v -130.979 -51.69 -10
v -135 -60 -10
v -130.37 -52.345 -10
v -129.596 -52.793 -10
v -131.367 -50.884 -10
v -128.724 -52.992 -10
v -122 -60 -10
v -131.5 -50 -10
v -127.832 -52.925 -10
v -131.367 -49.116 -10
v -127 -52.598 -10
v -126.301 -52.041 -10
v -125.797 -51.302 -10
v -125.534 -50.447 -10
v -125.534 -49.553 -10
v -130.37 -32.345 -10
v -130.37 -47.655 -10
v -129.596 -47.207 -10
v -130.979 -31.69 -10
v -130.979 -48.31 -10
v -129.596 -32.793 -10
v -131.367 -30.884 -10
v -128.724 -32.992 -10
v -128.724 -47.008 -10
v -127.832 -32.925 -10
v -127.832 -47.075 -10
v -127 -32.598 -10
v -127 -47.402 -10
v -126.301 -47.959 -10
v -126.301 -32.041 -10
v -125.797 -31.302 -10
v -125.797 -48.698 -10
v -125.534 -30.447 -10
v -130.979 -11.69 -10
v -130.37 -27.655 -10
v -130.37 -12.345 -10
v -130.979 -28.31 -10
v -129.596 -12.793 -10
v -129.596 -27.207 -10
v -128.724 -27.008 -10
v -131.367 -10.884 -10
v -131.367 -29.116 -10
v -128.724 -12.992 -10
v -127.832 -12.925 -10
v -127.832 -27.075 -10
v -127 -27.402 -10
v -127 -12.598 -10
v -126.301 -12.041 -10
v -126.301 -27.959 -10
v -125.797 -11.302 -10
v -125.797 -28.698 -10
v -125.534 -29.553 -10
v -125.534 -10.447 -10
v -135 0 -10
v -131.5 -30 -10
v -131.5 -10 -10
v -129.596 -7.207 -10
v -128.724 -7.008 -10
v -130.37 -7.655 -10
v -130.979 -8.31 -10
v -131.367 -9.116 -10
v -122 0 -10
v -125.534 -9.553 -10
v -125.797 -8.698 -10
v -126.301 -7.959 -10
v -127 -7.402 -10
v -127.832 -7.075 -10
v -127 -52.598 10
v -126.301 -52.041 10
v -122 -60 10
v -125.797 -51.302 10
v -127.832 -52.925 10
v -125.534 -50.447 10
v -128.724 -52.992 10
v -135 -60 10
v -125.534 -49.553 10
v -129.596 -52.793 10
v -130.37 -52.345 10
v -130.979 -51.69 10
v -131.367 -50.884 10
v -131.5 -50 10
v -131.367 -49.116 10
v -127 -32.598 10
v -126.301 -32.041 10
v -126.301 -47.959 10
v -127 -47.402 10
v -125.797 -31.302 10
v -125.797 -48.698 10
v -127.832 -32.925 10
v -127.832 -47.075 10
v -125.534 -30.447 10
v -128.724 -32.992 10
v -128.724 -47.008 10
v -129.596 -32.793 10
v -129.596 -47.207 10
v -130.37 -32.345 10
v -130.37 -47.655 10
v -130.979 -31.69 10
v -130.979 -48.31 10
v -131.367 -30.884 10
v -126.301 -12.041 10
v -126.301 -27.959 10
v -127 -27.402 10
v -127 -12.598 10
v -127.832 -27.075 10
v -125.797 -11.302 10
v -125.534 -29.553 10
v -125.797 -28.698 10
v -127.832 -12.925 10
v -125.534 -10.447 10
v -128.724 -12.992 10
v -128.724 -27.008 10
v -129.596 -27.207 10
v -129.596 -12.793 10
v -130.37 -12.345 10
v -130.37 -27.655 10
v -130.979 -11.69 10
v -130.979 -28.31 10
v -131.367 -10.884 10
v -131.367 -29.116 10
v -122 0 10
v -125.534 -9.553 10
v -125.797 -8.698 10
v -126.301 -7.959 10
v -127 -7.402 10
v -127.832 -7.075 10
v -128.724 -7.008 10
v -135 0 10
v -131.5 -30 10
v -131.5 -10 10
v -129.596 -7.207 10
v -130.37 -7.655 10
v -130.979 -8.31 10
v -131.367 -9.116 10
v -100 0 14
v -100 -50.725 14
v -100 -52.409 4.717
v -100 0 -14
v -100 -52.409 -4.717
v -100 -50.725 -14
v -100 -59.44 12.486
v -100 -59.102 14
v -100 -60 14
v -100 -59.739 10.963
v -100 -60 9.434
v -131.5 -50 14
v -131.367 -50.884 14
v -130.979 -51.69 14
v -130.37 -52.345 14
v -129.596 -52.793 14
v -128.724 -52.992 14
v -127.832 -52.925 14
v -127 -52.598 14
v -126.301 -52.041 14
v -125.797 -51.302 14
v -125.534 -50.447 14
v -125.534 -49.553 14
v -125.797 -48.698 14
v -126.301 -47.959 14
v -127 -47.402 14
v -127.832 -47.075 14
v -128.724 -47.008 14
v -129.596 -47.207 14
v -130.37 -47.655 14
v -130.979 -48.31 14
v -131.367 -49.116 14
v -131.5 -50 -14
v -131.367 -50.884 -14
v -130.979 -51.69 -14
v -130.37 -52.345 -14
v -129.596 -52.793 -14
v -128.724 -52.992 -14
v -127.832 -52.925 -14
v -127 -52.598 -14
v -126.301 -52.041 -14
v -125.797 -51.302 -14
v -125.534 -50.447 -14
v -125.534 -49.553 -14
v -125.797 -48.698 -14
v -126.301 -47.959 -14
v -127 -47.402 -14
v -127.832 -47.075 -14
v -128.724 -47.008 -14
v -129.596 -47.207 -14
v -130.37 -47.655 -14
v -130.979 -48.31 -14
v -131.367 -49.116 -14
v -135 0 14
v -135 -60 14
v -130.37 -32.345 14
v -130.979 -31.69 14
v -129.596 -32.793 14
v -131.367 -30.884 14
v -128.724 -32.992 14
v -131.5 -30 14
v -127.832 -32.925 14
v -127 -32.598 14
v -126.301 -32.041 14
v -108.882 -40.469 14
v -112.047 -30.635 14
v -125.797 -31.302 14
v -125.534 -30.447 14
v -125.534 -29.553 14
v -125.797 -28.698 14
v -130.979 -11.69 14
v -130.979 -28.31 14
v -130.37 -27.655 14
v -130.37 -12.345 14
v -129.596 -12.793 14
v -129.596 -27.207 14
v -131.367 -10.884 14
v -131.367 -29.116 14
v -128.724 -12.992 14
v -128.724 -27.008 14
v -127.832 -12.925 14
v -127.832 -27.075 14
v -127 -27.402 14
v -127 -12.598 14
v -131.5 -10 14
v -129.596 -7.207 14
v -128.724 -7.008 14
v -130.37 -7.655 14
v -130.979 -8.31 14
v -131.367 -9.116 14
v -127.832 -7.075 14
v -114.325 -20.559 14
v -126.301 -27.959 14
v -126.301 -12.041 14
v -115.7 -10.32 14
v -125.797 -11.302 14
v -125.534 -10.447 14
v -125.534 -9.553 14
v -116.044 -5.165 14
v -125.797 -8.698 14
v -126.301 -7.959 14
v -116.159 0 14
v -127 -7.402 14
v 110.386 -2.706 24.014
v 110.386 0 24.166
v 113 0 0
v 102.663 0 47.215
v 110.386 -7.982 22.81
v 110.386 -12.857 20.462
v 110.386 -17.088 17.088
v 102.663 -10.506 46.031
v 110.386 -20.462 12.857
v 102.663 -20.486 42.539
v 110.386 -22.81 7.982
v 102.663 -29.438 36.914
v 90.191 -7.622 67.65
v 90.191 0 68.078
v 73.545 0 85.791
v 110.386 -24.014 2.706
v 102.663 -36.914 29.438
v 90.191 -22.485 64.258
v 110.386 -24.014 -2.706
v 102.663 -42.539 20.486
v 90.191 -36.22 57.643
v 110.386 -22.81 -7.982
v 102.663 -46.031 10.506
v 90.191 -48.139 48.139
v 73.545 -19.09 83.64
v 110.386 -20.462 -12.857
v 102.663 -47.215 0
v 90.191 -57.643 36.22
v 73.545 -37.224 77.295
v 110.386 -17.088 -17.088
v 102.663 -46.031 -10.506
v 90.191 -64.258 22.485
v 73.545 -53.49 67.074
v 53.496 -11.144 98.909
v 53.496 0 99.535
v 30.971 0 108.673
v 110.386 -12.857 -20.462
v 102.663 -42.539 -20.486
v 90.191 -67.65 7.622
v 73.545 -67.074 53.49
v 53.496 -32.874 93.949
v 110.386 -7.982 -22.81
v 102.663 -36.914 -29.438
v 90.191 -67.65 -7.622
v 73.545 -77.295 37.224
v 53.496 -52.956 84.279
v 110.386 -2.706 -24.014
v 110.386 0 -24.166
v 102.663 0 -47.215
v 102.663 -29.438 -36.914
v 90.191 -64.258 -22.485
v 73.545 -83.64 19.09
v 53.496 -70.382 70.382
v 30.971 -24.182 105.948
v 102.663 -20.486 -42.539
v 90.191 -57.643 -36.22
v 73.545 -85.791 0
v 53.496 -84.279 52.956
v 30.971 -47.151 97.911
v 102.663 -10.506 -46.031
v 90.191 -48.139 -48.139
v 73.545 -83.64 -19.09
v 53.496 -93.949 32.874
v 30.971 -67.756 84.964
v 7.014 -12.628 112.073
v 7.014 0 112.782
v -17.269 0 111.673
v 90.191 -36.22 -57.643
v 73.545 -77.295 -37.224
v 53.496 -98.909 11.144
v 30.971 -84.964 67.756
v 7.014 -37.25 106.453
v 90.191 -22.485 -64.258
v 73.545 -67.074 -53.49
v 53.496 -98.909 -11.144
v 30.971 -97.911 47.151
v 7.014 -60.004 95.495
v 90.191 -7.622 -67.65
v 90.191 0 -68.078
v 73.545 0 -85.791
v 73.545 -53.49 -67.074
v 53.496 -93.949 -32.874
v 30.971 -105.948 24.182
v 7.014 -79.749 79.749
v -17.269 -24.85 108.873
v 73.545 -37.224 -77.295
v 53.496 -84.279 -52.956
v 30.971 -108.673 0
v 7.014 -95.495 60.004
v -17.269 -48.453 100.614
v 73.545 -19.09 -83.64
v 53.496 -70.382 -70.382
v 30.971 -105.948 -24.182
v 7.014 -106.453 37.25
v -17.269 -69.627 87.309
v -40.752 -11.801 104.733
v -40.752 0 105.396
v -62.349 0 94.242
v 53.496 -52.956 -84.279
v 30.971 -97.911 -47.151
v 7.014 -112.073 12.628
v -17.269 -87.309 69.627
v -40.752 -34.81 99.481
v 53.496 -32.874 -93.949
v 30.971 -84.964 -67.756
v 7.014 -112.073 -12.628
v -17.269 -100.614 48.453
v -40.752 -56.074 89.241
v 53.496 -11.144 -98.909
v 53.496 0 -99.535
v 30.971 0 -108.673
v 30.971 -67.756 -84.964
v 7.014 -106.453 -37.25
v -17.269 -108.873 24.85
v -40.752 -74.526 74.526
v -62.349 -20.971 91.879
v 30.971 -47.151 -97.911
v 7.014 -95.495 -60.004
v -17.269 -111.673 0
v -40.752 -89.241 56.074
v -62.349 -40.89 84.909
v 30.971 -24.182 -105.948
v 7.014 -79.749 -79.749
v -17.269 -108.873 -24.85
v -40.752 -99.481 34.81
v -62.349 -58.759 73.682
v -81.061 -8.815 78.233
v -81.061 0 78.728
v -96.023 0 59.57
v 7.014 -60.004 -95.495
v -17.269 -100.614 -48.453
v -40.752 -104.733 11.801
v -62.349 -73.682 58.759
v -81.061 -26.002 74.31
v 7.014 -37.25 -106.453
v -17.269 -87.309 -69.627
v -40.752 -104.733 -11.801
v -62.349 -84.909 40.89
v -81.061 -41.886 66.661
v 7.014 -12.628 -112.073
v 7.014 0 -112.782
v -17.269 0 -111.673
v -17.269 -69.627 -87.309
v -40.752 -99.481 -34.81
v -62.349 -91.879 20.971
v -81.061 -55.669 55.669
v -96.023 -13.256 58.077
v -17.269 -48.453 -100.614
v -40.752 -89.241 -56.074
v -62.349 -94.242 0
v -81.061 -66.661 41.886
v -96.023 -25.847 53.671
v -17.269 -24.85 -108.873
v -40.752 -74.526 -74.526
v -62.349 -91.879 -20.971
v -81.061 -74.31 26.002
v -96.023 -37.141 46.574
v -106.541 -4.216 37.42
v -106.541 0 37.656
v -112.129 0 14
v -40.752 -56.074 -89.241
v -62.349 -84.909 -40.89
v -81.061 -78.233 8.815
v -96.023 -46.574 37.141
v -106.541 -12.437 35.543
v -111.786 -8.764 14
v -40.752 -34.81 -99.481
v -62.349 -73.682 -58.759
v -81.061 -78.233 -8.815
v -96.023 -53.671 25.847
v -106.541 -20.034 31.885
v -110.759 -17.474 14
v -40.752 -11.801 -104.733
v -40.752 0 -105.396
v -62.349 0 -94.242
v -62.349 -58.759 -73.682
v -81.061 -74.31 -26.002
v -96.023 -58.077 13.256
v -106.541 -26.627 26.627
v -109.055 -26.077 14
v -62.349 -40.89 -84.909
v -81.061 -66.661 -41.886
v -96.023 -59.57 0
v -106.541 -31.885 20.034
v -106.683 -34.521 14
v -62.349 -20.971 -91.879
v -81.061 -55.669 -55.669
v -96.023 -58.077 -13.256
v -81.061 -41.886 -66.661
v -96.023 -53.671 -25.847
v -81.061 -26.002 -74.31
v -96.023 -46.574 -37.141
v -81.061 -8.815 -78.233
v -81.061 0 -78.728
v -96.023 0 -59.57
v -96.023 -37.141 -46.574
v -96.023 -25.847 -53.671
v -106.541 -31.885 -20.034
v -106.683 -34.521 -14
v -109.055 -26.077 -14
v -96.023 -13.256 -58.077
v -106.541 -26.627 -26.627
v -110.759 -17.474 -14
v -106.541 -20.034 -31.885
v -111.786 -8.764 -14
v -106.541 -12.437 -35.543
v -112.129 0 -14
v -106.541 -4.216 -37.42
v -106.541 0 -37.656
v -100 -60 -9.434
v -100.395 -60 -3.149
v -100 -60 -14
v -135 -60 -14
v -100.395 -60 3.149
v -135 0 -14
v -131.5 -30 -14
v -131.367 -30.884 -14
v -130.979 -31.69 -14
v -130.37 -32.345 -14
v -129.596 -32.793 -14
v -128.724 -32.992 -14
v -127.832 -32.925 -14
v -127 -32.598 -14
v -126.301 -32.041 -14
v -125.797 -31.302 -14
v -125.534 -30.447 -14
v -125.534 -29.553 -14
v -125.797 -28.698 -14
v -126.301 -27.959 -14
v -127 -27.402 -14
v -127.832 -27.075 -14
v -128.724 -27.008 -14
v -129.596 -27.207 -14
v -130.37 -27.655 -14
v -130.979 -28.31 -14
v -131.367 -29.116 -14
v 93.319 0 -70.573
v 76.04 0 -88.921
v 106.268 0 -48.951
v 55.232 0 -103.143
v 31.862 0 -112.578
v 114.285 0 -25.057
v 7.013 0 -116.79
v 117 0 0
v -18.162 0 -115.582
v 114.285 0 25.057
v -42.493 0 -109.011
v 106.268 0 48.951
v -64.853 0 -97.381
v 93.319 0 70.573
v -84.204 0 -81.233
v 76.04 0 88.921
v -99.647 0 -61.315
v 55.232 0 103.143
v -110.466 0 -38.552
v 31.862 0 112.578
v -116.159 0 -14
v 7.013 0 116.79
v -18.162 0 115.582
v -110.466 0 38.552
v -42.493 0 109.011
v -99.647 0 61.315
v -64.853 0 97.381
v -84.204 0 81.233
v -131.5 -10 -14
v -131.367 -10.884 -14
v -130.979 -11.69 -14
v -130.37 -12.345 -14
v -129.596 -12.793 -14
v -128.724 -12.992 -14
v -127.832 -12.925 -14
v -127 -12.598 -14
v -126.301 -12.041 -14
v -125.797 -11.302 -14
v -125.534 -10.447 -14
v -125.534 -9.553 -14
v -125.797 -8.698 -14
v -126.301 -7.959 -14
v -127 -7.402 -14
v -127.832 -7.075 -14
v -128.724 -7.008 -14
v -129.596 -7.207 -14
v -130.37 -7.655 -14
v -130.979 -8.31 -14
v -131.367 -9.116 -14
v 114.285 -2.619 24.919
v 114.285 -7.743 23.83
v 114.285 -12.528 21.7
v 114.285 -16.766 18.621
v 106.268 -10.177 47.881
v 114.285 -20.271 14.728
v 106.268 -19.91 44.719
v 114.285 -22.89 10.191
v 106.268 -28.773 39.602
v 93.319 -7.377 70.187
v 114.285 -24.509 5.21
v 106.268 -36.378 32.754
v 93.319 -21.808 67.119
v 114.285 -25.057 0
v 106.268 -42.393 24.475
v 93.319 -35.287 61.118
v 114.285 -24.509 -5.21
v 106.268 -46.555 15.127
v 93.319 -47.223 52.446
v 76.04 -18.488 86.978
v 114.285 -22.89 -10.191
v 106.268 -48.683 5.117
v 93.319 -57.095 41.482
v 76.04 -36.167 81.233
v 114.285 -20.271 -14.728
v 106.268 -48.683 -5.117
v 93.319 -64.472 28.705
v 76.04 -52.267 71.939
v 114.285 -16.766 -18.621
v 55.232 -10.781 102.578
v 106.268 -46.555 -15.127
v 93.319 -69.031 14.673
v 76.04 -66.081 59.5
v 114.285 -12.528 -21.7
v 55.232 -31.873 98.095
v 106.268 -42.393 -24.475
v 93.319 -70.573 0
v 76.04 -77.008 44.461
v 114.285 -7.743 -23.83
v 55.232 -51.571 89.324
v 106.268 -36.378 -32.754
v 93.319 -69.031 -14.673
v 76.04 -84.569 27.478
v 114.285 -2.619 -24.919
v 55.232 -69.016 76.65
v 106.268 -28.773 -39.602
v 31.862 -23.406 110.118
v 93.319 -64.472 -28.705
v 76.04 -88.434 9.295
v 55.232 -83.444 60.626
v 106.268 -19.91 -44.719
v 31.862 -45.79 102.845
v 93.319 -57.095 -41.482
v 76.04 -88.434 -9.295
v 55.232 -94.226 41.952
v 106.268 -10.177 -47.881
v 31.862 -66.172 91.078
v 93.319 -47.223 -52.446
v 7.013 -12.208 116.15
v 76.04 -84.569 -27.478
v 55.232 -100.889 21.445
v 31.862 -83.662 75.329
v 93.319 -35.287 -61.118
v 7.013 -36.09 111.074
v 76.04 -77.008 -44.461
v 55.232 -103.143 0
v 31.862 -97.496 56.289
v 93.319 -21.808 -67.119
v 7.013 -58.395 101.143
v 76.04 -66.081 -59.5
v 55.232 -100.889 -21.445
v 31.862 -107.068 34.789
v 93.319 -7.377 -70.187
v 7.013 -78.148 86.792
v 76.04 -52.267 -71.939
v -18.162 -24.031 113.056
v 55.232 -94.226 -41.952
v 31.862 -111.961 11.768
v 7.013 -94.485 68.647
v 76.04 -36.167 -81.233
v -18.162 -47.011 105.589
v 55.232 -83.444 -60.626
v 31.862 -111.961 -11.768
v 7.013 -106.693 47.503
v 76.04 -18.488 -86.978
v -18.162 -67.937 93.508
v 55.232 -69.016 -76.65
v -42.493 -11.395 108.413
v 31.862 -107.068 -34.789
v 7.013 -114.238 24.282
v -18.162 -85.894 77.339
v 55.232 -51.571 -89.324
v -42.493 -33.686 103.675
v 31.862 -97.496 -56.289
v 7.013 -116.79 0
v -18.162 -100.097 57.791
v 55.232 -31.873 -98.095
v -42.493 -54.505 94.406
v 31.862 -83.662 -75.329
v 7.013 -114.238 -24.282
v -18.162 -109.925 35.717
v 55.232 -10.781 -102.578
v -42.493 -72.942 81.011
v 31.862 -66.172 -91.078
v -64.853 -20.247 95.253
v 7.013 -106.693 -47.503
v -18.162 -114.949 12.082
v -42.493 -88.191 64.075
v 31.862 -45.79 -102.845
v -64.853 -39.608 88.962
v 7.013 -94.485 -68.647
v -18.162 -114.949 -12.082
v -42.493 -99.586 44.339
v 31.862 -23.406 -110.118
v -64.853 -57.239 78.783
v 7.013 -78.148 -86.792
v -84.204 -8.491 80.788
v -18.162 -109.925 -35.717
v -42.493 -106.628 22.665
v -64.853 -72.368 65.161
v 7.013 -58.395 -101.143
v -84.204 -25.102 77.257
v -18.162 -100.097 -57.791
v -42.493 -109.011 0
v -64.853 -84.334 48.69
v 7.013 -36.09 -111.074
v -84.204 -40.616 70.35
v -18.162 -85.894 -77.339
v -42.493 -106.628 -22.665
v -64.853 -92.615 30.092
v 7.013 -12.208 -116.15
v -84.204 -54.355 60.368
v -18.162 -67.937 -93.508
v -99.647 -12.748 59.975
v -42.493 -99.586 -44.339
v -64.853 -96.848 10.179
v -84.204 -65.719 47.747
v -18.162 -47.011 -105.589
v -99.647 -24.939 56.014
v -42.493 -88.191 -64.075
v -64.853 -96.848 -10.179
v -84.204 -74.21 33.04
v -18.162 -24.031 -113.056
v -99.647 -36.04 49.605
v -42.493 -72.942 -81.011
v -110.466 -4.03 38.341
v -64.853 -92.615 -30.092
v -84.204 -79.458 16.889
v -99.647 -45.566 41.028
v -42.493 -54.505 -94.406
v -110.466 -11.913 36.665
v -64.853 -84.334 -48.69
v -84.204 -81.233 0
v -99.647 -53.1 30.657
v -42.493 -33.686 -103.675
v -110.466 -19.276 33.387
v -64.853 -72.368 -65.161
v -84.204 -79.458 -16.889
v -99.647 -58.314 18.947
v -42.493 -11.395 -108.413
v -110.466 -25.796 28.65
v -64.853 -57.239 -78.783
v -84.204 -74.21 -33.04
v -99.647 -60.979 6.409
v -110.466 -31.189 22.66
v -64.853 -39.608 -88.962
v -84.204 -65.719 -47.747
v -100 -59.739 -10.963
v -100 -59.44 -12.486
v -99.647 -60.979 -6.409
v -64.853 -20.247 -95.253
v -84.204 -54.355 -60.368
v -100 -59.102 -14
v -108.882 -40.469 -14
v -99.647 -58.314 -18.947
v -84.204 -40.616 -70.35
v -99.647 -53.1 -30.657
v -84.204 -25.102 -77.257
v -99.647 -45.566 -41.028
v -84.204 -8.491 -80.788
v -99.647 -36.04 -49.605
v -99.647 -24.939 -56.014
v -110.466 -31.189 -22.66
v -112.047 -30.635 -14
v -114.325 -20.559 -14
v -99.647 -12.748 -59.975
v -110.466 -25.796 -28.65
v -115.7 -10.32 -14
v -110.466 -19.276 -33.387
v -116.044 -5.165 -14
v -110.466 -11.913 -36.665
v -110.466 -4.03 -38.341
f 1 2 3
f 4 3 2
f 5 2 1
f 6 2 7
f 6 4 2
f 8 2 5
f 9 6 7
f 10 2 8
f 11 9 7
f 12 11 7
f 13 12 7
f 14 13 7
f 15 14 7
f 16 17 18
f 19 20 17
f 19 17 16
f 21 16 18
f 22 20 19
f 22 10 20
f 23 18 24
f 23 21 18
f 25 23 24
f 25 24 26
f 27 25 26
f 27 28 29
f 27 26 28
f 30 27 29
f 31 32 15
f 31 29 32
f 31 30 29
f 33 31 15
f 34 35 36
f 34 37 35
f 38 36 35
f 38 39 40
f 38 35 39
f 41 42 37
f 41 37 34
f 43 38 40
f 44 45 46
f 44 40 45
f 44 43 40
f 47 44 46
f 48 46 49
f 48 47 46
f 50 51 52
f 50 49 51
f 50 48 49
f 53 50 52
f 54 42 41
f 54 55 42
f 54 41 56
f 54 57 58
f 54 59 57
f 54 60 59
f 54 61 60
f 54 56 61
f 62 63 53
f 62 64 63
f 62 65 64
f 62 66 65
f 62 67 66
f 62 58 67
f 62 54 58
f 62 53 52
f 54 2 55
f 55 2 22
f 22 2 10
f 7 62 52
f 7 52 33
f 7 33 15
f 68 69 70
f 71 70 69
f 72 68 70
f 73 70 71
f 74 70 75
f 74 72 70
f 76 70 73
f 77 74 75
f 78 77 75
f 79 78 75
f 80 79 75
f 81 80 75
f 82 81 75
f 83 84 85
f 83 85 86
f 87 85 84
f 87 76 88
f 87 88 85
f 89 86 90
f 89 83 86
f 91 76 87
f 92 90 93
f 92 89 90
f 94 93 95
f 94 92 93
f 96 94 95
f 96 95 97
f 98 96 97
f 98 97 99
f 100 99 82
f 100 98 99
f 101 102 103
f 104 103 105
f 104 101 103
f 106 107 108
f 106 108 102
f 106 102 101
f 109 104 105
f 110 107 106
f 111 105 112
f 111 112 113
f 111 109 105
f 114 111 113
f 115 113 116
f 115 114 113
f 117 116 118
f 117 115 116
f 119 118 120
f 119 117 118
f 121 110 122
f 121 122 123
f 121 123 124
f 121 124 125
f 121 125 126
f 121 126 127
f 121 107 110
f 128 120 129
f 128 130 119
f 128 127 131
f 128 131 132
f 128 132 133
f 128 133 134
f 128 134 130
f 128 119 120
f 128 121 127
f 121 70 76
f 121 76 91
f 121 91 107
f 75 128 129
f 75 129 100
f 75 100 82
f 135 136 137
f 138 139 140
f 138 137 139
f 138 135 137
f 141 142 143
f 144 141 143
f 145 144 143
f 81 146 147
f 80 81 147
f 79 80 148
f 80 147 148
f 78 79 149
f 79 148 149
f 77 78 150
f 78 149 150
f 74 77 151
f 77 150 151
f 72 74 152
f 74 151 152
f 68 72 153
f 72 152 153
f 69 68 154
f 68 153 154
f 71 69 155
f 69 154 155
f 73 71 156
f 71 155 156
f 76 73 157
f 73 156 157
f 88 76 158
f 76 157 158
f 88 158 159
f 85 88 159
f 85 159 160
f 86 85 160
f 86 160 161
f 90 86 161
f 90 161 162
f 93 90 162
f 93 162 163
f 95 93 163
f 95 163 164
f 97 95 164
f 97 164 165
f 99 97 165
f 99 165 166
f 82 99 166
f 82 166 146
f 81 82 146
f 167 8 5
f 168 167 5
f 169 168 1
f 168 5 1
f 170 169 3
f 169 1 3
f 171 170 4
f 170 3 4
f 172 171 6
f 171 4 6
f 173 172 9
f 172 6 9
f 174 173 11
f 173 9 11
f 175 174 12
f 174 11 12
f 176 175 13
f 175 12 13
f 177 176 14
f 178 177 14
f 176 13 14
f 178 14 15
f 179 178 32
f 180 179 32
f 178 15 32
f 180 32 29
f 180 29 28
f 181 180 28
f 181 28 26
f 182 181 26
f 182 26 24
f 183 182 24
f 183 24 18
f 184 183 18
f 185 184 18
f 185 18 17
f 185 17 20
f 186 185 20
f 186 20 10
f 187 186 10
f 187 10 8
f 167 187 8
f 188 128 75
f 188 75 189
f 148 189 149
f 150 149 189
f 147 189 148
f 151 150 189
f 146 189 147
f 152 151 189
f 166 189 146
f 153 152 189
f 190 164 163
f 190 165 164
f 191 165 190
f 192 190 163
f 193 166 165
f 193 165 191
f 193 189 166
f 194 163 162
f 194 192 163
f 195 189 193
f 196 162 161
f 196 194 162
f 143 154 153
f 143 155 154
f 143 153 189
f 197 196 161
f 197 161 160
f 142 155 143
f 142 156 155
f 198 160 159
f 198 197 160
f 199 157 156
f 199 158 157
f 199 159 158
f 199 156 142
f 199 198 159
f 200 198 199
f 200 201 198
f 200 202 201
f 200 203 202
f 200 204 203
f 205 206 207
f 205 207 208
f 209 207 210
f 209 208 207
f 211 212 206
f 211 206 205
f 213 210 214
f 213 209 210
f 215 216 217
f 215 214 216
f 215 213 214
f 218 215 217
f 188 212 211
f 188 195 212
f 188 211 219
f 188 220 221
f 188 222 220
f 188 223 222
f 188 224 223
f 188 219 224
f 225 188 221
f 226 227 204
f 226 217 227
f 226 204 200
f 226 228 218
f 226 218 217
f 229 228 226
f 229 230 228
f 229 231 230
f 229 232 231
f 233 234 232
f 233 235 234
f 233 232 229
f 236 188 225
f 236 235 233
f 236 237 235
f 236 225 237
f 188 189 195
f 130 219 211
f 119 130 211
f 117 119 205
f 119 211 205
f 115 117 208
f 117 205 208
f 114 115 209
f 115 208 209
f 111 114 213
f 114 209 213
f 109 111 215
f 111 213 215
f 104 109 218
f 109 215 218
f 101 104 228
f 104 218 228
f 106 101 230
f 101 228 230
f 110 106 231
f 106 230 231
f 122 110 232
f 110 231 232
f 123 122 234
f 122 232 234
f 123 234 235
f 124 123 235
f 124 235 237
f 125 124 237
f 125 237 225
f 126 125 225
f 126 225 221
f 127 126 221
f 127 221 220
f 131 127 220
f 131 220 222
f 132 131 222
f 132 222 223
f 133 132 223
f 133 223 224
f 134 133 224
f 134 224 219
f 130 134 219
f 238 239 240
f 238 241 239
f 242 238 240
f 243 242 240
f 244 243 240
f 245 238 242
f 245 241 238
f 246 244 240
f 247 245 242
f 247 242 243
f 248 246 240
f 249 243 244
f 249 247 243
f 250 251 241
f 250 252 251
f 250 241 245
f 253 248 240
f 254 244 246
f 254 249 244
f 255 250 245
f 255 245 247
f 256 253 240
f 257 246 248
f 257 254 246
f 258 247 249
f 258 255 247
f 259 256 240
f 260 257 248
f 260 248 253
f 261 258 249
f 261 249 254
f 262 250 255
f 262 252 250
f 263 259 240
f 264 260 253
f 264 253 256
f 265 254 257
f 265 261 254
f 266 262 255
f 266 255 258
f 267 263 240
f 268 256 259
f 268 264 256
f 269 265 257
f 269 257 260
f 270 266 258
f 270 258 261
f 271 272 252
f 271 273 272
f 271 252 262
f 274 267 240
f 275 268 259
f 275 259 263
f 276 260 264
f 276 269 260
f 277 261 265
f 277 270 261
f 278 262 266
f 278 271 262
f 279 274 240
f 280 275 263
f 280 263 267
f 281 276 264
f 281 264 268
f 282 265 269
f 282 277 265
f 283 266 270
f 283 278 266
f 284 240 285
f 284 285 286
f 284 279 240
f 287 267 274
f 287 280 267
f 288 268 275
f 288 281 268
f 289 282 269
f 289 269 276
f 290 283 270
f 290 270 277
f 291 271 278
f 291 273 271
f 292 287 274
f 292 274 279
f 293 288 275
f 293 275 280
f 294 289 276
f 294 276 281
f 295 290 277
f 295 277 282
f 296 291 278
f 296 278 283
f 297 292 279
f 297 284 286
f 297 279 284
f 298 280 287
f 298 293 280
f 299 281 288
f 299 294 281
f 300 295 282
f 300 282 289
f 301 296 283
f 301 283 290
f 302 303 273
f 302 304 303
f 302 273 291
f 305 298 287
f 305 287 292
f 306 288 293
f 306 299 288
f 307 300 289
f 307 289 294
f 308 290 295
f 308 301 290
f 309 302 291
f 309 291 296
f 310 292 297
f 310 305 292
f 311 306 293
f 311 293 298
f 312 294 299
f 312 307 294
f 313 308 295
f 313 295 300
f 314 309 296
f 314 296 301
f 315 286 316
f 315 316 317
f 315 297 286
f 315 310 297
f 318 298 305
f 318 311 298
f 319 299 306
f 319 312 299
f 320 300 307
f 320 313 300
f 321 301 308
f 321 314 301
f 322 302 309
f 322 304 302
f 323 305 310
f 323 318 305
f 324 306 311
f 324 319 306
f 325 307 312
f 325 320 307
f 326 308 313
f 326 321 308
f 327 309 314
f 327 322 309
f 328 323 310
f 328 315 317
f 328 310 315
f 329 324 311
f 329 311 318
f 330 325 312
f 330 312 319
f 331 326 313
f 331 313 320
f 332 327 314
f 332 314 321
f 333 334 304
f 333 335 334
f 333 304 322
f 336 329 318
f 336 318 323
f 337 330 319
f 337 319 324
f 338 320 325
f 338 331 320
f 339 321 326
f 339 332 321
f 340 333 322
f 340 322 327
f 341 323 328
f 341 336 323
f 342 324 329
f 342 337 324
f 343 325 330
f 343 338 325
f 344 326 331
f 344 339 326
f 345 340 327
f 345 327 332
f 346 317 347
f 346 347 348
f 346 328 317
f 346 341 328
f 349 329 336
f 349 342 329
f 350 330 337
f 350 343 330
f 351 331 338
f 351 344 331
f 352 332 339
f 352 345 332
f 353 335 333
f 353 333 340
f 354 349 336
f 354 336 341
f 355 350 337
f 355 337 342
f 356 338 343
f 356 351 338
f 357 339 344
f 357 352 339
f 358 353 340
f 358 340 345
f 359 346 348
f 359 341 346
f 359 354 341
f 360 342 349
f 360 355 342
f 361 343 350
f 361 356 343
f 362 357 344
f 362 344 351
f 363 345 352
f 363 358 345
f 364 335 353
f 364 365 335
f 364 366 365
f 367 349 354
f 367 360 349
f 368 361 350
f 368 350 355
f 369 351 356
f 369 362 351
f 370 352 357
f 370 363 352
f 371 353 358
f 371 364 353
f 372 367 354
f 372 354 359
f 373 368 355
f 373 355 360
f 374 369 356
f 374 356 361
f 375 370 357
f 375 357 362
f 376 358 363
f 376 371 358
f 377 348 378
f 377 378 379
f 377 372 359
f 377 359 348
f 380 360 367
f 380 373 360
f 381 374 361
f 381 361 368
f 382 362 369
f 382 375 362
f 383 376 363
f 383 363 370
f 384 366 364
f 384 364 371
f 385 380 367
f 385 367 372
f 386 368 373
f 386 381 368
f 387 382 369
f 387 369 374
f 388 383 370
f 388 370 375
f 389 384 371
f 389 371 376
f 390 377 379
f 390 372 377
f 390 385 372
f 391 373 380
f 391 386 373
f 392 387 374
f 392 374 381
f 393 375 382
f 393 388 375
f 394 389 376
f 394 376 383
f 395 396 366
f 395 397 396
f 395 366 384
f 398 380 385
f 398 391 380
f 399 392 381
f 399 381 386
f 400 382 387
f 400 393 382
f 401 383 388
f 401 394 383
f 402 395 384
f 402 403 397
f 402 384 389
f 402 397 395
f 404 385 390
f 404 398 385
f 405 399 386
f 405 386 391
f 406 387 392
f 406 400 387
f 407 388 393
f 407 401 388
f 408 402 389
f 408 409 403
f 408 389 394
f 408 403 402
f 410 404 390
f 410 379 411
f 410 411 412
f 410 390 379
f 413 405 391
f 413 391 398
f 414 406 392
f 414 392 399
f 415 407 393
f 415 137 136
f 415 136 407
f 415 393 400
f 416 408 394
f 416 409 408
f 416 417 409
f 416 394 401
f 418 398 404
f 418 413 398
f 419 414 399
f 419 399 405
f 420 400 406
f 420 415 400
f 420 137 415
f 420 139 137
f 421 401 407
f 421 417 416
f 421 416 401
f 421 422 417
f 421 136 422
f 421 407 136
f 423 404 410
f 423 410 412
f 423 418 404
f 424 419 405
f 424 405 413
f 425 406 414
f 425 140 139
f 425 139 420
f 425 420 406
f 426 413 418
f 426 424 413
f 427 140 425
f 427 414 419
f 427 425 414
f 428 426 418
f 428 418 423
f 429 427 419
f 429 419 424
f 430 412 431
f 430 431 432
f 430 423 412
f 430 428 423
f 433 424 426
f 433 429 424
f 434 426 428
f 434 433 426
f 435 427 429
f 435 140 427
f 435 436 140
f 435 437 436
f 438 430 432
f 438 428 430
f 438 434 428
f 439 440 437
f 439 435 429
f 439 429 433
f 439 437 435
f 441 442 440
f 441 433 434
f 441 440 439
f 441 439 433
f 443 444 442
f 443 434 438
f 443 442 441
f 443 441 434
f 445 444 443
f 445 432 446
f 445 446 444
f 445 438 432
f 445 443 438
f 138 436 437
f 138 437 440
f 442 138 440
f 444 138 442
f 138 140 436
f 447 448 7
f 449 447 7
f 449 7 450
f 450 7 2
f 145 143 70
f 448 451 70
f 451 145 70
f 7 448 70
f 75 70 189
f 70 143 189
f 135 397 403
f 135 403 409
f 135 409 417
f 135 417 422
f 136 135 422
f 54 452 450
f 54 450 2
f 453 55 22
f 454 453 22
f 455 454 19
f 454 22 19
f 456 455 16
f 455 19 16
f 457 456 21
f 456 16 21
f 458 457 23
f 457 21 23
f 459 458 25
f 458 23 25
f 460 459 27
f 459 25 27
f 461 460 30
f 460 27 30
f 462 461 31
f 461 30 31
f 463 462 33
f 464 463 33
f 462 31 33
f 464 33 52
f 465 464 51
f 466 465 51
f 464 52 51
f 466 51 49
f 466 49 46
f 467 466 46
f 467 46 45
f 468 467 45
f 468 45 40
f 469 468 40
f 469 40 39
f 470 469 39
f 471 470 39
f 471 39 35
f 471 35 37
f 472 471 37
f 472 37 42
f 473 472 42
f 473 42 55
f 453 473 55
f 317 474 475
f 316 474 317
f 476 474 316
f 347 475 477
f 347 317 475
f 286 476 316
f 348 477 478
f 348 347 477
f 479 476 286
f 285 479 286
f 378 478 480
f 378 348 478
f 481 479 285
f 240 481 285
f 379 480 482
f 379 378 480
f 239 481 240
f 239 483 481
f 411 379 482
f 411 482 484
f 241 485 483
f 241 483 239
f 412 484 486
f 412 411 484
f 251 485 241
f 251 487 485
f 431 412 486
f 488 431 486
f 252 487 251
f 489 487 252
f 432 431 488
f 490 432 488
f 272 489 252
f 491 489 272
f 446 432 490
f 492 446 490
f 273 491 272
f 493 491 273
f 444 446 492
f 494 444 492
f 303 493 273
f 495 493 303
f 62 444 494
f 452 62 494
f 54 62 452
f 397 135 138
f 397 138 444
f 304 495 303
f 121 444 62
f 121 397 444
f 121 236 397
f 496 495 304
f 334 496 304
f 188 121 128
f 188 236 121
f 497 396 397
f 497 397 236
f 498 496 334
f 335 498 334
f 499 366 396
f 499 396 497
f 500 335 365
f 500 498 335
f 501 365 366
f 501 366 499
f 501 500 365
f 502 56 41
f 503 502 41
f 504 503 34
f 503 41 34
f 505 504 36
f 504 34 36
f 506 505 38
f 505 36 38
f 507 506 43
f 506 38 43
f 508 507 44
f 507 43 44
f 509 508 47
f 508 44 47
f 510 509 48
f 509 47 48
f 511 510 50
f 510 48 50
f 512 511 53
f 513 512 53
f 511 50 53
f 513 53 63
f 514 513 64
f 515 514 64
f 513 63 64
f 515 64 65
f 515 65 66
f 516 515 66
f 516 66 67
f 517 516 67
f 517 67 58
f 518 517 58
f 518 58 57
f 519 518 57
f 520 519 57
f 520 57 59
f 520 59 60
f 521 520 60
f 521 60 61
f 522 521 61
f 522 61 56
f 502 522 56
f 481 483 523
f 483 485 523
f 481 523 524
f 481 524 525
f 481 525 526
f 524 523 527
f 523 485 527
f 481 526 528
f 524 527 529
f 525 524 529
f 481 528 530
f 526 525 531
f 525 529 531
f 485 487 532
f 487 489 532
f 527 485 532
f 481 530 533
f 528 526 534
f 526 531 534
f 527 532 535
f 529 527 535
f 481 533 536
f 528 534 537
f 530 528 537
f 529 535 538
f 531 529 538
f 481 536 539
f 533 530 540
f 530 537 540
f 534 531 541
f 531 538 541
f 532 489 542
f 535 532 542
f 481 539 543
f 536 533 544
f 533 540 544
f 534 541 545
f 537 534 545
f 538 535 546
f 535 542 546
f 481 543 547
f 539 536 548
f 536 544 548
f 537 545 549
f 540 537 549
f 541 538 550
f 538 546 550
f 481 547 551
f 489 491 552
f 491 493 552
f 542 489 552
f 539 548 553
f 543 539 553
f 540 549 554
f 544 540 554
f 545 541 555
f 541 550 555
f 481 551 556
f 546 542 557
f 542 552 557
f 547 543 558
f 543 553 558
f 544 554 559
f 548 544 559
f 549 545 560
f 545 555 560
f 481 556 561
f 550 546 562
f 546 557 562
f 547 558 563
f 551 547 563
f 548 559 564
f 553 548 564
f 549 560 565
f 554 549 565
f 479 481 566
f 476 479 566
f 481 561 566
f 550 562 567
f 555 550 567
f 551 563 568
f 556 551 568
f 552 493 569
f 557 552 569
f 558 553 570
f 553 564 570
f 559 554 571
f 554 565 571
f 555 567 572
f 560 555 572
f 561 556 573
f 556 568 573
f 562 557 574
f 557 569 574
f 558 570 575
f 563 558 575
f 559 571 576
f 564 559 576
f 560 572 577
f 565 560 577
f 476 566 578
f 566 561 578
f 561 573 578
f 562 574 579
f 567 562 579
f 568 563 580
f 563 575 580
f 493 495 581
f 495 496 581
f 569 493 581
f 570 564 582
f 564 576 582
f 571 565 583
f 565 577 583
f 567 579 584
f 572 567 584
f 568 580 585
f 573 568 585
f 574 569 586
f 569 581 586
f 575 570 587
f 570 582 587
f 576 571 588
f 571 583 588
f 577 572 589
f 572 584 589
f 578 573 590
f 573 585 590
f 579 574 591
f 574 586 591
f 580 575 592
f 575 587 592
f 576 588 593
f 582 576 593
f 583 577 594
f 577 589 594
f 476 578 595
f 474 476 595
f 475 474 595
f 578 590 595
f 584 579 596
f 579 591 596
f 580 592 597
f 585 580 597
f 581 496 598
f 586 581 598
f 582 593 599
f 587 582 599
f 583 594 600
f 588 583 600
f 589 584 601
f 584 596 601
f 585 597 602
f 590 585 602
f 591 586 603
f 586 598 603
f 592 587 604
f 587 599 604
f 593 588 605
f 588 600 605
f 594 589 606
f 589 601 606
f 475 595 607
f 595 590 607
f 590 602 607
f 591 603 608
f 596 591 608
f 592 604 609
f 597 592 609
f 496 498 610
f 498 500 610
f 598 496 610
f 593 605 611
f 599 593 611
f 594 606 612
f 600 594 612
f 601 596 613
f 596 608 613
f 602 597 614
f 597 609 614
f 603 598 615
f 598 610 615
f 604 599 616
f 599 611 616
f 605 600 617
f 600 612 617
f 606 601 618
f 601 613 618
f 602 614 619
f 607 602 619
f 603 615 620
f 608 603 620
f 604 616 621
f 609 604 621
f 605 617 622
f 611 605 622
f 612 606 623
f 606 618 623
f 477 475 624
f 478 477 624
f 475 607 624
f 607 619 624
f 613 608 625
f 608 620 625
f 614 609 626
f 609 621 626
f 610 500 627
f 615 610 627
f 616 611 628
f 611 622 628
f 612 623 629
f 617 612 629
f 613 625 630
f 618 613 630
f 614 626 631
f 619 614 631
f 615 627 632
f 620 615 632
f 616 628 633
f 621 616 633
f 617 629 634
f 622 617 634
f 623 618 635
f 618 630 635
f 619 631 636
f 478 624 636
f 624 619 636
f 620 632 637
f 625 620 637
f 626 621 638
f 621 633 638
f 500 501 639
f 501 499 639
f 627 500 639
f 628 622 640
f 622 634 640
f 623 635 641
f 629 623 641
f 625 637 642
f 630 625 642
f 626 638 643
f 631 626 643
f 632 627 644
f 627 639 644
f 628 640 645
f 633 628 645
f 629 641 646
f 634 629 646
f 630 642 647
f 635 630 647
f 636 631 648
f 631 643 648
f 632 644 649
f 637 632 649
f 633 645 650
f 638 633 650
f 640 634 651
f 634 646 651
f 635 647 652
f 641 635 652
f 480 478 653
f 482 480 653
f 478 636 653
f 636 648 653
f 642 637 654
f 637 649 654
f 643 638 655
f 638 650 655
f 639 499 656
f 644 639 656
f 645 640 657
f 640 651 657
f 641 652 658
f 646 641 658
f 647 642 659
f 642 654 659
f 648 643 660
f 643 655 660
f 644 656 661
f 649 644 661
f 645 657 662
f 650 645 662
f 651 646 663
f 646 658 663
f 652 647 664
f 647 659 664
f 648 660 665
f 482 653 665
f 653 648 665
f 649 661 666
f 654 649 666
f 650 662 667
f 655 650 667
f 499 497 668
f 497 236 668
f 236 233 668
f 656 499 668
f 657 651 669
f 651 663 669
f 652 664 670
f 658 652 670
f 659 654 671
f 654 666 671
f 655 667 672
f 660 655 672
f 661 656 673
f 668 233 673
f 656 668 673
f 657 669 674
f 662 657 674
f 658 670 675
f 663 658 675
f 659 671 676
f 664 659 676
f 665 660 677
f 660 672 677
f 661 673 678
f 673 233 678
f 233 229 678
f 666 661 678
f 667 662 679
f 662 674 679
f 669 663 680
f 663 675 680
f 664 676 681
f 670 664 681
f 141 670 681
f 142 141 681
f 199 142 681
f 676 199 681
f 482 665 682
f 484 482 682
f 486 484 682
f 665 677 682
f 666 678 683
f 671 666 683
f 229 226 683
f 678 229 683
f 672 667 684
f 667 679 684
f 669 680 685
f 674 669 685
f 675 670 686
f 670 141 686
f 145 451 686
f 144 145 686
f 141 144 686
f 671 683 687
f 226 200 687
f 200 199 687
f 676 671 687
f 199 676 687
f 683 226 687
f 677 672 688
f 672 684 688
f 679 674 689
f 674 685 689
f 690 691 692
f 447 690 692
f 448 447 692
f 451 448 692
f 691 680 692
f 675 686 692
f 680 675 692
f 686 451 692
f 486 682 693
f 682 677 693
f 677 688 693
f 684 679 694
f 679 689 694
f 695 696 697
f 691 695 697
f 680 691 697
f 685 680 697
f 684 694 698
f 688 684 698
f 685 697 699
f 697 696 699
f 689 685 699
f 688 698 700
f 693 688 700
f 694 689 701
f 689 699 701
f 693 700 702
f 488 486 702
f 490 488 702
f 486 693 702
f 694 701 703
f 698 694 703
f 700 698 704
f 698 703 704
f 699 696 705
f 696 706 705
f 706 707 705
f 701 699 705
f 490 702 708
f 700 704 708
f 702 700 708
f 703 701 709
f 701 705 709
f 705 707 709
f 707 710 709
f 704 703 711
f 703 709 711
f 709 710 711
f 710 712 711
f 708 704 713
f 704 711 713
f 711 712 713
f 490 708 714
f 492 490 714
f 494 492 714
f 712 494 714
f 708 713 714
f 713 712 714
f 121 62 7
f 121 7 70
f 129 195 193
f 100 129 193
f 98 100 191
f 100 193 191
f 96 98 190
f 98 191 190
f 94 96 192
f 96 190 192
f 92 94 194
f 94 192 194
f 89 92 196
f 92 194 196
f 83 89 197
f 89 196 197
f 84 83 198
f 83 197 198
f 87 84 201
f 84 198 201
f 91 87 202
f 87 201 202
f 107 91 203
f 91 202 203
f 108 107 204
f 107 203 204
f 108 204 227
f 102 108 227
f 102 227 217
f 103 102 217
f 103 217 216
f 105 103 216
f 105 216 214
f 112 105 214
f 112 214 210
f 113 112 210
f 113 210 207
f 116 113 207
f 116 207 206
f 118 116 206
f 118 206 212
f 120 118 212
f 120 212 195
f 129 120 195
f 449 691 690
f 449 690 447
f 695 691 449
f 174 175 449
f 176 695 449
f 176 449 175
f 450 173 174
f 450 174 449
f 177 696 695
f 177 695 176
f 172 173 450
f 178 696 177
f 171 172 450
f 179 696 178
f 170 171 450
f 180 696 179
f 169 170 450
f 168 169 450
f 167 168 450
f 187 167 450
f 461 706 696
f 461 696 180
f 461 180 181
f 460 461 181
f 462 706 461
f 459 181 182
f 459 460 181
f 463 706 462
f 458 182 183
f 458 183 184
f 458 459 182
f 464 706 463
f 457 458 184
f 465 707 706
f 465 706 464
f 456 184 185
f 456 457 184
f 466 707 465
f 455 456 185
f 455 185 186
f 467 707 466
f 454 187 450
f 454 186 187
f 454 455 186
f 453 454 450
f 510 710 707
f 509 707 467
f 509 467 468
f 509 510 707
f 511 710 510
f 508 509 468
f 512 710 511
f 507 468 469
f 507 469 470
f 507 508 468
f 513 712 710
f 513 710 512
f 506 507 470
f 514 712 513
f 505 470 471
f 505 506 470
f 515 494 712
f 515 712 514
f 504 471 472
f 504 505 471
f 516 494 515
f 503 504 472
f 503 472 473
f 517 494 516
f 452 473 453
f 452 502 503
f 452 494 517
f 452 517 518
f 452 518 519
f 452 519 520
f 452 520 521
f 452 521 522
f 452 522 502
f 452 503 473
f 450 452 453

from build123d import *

# Parameters (mm, degrees)
REVOLUTION_ANGLE = 180
PAD_DEPTH        = 60
SKETCH002_R      = 3
HOLE_DEPTH       = 131.001


with BuildPart() as part:
    # Sketch → Revolution (revolve)
    with BuildSketch(Plane.XZ):
        with BuildLine():
            ThreePointArc((117, 0), (0, 117), (-117, 0))
            Line((-117, 0), (-113, 0))
            ThreePointArc((113, 0), (0, 113), (-113, 0))
            Line((113, 0), (117, 0))
        make_face()
    revolve(axis=Axis((0, 0, 0), (1, 0, 0)), revolution_arc=REVOLUTION_ANGLE)

    # Sketch001 → Pad (new body)
    with BuildSketch(Plane.XZ):
        Polygon((-100, 14), (-100, -14), (-135, -14), (-135, -10), (-122, -10), (-122, 10), (-135, 10), (-135, 14), align=None)
    extrude(amount=PAD_DEPTH)

    # Sketch002 (on Face3 of Pad) → Hole (cut, through all)
    with BuildSketch(Plane(origin=(0, 0, 14), x_dir=(-1, 0, 0), z_dir=(0, 0, 1))):
        with Locations((128.5, 10)):
            Circle(SKETCH002_R)
        with Locations((128.5, 30)):
            Circle(SKETCH002_R)
        with Locations((128.5, 50)):
            Circle(SKETCH002_R)
    extrude(amount=-HOLE_DEPTH, mode=Mode.SUBTRACT)


solid = part.part
